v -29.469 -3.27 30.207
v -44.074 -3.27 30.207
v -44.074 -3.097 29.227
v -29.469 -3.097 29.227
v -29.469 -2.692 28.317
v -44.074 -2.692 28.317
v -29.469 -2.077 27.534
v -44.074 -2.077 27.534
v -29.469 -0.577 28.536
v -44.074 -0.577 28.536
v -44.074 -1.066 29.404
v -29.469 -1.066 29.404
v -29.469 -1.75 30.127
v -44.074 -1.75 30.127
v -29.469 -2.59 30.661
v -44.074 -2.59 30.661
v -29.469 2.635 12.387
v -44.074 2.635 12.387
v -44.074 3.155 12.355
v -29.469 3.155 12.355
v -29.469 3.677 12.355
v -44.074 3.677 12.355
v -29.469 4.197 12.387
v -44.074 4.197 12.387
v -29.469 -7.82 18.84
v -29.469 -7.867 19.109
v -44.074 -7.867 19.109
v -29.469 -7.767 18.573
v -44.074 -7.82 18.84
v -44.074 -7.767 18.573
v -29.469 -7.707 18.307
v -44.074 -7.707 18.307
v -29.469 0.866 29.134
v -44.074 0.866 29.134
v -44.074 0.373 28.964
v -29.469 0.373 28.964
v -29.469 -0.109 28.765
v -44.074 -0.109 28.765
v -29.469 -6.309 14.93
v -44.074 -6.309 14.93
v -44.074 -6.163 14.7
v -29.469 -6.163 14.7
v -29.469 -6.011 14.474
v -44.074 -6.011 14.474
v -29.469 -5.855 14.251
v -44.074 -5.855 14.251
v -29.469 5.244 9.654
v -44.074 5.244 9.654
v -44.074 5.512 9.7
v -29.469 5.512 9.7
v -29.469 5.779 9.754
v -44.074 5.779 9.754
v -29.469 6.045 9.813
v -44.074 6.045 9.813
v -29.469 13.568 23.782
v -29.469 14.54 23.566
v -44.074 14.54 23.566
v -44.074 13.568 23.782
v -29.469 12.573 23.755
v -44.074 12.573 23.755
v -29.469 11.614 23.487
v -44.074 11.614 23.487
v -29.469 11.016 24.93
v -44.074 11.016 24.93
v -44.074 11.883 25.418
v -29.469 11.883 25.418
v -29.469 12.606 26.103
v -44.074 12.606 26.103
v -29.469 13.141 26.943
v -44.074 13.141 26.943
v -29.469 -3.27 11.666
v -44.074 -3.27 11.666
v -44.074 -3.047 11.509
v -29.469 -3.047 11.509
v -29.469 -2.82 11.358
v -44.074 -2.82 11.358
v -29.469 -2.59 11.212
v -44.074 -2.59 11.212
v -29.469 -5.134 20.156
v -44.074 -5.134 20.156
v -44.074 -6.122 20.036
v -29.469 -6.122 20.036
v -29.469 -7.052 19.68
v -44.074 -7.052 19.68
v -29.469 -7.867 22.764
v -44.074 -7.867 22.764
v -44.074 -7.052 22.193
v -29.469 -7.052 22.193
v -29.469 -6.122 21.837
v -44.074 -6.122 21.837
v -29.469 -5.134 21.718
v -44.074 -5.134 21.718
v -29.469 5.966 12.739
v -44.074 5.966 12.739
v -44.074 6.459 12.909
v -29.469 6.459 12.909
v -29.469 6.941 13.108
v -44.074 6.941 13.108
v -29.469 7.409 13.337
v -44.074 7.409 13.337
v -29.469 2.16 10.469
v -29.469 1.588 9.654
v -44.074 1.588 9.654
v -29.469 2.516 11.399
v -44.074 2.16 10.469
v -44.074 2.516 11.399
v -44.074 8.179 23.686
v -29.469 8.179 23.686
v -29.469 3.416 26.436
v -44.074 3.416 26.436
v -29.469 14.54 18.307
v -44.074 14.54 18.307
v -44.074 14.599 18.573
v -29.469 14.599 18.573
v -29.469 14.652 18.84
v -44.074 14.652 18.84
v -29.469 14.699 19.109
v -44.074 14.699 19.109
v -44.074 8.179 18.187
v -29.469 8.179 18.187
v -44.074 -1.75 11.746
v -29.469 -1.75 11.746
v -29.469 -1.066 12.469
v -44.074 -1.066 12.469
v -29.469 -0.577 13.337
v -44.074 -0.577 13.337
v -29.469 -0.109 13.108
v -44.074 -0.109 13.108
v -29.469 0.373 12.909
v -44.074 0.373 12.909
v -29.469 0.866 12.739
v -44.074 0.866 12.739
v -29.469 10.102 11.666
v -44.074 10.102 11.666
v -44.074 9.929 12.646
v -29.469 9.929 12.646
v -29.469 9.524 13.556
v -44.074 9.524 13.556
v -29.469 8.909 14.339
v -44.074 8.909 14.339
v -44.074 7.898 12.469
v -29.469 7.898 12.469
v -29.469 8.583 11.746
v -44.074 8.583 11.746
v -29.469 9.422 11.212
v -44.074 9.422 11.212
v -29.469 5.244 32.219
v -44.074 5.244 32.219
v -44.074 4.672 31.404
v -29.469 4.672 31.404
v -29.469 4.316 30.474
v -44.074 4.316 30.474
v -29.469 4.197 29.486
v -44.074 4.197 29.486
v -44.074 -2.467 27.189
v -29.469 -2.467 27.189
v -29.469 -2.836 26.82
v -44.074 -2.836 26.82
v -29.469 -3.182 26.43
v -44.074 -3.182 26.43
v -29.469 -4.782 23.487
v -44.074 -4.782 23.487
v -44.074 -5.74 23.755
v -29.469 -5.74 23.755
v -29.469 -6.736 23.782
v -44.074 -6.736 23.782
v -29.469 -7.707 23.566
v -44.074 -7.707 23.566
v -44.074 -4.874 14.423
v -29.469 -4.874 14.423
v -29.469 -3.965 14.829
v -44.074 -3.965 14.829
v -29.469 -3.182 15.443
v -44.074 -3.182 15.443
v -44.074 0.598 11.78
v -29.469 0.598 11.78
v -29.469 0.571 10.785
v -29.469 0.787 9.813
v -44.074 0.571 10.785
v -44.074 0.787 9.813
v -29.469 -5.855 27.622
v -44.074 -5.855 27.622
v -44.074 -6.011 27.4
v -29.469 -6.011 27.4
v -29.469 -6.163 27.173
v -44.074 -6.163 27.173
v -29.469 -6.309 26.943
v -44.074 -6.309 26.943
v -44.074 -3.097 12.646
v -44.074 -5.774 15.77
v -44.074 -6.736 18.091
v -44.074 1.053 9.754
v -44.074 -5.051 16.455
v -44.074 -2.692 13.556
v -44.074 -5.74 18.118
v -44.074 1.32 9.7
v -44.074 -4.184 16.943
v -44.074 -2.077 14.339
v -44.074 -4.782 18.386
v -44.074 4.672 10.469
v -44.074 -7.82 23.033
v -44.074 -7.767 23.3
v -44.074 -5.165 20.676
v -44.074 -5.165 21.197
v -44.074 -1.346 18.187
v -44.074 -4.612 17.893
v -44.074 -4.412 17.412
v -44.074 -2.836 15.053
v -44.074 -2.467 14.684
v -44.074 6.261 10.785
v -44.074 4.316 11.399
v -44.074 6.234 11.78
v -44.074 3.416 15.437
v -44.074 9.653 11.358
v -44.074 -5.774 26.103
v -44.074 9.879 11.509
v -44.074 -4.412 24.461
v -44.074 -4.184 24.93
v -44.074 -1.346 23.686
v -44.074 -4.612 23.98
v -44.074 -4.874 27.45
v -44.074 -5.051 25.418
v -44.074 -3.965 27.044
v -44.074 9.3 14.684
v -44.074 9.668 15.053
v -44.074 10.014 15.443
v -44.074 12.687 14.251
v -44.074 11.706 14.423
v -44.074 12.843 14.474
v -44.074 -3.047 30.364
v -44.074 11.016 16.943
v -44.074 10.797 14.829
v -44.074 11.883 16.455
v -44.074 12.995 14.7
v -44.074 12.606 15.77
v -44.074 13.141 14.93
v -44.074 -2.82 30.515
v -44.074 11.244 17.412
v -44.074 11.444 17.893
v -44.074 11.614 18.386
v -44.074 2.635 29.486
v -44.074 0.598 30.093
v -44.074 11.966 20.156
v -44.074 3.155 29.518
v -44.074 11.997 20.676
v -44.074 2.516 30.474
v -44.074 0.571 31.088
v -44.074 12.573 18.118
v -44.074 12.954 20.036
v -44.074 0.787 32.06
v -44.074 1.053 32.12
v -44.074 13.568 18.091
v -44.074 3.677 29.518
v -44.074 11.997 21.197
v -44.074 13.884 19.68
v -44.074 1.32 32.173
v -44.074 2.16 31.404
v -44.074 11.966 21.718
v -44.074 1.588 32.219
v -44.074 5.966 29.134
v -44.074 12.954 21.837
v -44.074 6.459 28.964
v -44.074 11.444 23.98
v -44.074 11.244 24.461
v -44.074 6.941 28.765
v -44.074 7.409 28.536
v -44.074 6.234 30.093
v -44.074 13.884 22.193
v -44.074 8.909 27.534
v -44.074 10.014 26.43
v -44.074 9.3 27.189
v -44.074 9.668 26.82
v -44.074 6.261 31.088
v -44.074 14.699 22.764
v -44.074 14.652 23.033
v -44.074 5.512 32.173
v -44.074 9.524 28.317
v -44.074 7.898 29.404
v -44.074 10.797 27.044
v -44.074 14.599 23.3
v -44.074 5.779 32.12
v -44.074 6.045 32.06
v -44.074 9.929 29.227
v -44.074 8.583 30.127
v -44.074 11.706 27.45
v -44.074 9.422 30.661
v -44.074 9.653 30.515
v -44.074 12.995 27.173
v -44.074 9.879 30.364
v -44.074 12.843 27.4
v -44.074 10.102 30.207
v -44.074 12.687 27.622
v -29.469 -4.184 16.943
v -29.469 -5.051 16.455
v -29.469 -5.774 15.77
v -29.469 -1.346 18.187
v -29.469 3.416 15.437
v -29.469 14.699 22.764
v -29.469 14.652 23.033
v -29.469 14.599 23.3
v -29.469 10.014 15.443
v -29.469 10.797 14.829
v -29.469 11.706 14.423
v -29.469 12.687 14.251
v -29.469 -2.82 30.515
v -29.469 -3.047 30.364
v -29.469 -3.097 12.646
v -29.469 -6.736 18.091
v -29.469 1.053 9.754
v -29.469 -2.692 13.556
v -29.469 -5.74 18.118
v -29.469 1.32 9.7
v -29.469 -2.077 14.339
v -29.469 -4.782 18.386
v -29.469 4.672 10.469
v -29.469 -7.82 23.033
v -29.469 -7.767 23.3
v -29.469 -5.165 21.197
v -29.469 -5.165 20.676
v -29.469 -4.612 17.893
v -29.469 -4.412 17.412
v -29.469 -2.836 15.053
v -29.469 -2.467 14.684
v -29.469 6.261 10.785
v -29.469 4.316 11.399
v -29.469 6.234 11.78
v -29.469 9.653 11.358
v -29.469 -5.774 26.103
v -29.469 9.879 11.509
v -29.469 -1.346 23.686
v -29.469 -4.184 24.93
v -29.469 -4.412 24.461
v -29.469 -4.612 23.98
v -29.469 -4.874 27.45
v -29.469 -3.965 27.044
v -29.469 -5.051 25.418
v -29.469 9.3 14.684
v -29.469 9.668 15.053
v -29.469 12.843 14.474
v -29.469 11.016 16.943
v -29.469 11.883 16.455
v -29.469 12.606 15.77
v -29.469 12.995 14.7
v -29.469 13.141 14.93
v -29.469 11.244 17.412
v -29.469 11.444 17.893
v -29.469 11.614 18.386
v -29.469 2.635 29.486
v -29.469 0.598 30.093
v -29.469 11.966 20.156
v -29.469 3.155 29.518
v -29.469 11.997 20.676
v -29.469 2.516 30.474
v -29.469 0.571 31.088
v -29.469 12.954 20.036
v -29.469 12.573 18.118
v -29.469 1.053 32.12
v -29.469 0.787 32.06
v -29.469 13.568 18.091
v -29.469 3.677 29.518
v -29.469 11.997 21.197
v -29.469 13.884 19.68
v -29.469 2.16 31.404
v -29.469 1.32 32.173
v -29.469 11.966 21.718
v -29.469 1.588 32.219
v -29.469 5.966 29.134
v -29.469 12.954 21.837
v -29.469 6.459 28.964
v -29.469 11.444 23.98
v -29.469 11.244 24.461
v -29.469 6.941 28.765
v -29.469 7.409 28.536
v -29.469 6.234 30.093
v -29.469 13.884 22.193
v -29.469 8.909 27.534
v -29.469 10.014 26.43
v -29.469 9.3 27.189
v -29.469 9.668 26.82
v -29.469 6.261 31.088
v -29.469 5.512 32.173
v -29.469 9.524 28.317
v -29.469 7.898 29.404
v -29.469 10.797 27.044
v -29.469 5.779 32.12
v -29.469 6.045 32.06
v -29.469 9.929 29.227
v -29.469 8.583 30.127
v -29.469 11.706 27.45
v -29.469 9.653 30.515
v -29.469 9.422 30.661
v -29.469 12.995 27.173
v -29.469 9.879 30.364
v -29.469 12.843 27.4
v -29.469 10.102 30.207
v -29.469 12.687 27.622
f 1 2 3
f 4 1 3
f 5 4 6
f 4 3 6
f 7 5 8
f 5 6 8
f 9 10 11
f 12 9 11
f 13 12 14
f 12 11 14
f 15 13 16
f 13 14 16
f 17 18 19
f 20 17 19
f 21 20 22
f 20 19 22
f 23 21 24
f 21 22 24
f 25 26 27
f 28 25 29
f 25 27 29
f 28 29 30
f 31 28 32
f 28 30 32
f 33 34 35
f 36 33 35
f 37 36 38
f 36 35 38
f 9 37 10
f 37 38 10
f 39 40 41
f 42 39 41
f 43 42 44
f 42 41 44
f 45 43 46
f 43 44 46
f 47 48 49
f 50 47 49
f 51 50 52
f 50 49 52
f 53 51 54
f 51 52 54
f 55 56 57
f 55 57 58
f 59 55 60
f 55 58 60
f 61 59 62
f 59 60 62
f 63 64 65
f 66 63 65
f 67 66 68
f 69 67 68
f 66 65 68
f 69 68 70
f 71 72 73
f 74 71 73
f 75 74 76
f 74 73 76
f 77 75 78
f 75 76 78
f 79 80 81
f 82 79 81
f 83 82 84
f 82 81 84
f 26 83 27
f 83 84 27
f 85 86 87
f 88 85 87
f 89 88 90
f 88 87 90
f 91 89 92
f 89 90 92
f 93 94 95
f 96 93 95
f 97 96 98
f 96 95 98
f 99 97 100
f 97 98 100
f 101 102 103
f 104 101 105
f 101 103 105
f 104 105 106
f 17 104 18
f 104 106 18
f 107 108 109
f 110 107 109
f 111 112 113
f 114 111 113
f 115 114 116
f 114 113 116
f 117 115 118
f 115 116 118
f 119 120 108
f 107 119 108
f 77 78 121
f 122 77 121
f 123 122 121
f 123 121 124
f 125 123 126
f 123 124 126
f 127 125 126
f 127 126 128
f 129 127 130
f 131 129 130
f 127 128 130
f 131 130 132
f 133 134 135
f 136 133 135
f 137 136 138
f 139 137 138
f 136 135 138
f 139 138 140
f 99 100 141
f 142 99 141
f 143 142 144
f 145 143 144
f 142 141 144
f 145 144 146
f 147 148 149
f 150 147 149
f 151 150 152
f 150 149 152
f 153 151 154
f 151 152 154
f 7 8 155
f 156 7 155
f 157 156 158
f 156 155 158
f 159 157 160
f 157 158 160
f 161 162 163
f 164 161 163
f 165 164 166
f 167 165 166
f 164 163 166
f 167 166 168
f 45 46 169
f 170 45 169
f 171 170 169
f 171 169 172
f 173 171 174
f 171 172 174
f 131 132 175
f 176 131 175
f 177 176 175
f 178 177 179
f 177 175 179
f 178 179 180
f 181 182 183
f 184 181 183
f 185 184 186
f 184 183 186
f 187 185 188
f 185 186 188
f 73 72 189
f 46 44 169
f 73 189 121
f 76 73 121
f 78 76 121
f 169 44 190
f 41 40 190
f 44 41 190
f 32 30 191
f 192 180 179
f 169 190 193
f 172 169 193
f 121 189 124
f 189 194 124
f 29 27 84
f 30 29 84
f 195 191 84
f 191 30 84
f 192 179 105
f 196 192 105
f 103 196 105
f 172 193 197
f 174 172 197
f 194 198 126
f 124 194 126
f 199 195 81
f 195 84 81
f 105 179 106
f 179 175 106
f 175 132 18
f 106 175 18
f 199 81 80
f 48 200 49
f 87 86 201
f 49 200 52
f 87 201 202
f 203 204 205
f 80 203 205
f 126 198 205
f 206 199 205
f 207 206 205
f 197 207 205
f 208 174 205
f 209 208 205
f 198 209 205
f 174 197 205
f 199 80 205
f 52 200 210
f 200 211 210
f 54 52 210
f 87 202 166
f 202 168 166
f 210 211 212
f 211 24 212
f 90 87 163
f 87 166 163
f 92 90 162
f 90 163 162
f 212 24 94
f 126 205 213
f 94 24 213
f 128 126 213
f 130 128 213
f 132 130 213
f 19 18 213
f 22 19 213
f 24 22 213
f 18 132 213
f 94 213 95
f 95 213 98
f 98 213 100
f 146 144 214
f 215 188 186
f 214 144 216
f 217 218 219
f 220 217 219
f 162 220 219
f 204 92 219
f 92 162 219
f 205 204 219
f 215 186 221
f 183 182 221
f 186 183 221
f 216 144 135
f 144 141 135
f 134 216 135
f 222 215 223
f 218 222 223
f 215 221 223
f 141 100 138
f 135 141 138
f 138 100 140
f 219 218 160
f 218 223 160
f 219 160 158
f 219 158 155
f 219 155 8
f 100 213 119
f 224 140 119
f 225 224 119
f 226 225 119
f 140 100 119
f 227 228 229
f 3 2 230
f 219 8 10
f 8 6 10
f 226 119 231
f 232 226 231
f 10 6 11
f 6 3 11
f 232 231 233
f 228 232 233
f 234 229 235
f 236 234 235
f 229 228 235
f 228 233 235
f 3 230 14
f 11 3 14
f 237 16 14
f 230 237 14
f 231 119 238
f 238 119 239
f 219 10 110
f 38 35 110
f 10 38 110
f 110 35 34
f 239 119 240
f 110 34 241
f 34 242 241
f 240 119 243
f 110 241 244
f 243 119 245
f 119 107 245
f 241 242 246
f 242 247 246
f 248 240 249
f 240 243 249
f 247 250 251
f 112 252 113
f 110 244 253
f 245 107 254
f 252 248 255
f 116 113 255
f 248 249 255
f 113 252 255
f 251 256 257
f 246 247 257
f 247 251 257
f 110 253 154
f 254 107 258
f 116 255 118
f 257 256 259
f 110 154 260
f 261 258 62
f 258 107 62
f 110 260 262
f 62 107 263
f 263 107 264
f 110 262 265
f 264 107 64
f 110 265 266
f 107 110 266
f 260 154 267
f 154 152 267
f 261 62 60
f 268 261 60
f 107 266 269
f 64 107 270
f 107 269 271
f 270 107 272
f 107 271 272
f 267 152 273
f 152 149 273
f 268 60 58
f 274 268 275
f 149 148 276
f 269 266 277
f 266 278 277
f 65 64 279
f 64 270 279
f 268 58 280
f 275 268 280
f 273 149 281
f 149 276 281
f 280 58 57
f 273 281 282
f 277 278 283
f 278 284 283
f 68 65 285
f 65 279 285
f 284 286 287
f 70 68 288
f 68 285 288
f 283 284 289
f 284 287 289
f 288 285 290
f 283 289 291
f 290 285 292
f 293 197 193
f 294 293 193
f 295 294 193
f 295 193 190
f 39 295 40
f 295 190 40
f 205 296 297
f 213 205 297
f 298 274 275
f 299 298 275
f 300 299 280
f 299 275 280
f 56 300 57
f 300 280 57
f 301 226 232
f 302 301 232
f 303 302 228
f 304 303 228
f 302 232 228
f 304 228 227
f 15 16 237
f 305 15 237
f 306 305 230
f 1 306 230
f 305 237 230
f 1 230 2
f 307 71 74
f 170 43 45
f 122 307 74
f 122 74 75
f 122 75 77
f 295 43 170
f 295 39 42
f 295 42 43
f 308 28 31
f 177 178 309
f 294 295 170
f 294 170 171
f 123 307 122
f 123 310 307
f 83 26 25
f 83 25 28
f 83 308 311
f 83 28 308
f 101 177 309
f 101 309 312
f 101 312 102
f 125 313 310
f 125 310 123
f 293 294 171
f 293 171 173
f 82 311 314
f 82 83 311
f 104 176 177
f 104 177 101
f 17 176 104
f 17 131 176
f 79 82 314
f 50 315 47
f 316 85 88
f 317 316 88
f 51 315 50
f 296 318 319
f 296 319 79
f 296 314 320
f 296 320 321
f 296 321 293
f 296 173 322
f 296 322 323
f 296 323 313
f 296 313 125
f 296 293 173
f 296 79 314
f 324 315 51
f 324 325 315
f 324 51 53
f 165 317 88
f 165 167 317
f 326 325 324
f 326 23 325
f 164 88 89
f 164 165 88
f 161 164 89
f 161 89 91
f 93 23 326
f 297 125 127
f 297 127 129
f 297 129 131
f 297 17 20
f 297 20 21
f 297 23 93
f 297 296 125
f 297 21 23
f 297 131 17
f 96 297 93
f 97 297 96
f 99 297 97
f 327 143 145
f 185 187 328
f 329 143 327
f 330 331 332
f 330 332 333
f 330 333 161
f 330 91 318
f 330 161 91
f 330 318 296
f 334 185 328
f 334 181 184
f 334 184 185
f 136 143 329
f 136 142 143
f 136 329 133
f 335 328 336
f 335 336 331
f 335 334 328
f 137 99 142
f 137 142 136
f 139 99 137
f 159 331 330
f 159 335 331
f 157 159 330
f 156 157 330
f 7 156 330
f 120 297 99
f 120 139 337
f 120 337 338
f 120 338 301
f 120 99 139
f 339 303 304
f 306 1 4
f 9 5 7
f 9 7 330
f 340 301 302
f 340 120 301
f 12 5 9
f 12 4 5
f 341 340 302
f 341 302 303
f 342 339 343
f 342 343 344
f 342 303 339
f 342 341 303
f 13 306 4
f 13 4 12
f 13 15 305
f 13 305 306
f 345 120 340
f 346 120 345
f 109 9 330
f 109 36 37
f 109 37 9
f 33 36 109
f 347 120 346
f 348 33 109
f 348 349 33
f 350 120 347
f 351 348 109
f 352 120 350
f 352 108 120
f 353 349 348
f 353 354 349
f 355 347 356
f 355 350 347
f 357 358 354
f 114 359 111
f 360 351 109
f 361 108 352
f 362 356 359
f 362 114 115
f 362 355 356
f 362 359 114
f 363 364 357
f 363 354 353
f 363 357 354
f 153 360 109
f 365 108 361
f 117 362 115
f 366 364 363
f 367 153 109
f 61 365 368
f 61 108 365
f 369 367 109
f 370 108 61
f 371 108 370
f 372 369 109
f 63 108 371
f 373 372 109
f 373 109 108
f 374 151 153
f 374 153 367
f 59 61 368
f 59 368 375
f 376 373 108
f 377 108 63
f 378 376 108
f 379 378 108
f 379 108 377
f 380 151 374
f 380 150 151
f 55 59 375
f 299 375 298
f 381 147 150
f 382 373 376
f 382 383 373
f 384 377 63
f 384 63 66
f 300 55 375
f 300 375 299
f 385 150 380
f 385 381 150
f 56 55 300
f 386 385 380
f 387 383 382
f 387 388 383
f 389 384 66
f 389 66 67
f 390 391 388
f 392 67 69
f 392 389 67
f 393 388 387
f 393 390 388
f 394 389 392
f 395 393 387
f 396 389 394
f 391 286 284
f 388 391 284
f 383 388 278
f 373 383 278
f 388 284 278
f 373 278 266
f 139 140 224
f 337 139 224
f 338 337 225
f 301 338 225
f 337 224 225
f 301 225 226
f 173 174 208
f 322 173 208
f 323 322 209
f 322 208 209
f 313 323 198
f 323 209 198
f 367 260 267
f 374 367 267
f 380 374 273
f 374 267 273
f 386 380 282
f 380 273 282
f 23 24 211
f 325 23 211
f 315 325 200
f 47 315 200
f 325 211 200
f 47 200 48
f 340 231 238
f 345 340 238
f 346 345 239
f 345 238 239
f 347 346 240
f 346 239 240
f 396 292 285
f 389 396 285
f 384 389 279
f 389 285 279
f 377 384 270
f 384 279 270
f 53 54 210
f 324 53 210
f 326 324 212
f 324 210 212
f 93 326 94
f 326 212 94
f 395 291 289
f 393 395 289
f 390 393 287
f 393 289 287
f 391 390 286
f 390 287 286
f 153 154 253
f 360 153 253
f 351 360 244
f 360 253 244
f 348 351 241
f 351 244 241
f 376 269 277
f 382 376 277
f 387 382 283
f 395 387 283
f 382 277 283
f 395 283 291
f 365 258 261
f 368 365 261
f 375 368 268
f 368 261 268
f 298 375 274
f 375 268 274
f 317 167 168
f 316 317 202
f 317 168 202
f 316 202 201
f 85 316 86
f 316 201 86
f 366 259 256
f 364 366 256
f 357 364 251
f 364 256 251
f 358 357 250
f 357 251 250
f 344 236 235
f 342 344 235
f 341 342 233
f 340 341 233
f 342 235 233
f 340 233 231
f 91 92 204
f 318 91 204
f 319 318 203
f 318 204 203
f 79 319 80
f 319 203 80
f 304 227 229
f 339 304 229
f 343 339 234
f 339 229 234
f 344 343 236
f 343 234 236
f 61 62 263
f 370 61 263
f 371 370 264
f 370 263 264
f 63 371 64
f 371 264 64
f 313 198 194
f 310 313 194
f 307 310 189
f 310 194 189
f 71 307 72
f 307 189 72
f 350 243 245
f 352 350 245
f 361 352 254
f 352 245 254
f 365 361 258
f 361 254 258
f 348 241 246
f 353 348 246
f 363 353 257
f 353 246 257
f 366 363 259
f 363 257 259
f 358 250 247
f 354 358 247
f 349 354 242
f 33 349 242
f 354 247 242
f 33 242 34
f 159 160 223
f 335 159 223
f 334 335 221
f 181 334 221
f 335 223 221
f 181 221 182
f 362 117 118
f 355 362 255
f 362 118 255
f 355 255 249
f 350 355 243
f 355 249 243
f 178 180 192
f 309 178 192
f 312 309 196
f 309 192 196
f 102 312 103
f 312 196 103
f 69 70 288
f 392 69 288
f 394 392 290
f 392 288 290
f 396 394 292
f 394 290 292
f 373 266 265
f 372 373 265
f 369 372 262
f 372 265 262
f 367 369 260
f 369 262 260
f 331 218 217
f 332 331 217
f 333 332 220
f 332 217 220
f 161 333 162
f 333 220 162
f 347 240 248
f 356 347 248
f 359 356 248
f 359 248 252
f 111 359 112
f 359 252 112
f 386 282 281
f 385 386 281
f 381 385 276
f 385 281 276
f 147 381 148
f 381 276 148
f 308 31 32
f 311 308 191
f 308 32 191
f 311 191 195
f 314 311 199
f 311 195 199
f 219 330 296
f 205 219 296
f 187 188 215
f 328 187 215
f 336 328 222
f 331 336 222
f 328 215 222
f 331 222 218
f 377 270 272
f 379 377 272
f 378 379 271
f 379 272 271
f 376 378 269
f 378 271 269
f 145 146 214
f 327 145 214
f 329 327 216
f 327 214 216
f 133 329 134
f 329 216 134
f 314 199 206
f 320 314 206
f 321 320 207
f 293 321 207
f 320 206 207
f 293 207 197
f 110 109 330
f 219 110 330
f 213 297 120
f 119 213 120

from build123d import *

# Parameters (mm, degrees)
SPUR_START             = -44.074195703
SPUR_GEAR_AI_OUTLINE_R = 4.7625
SPUR_GEAR_AI_DEPTH     = 14.605
CUT_EXTRUDE1_DEPTH     = 39.307434666


# Read off the part's stored shape, not the designer's step: spur gear_ai
with BuildPart() as part:
    # spur gear_ai outline → spur gear_ai (new body)
    with BuildSketch(Plane.YZ.offset(SPUR_START)):
        with BuildLine():
            ThreePointArc((12.686684526, 14.250652999), (12.919777657, 14.586350288), (13.140720632, 14.930166051))
            ThreePointArc((13.140720632, 14.930166051), (12.265878987, 16.134593199), (11.016013995, 16.943190851))
            ThreePointArc((11.016013995, 16.943190851), (11.347770551, 17.651104248), (11.613753604, 18.386261921))
            ThreePointArc((11.613753604, 18.386261921), (13.069306498, 18.074238793), (14.539571561, 18.307290937))
            ThreePointArc((14.539571561, 18.307290937), (14.626455743, 18.70663567), (14.699007839, 19.108831233))
            ThreePointArc((14.699007839, 19.108831233), (13.429845234, 19.88678942), (11.965683625, 20.155533616))
            ThreePointArc((11.965683625, 20.155533616), (12.001279988, 20.936518051), (11.965683625, 21.717502486))
            ThreePointArc((11.965683625, 21.717502486), (13.429845234, 21.986246682), (14.699007839, 22.764204869))
            ThreePointArc((14.699007839, 22.764204869), (14.626455743, 23.166400432), (14.539571561, 23.565745165))
            ThreePointArc((14.539571561, 23.565745165), (13.069306498, 23.79879731), (11.613753604, 23.486774182))
            ThreePointArc((11.613753604, 23.486774182), (11.347770551, 24.221931855), (11.016013995, 24.929845251))
            ThreePointArc((11.016013995, 24.929845251), (12.265878987, 25.738442903), (13.140720632, 26.942870051))
            ThreePointArc((13.140720632, 26.942870051), (12.919777657, 27.286685815), (12.686684526, 27.622383104))
            ThreePointArc((12.686684526, 27.622383104), (11.239151532, 27.275049128), (10.013802086, 26.42976137))
            ThreePointArc((10.013802086, 26.42976137), (9.486733126, 27.007171189), (8.909323306, 27.534240149))
            ThreePointArc((8.909323306, 27.534240149), (9.754611065, 28.759589595), (10.10194504, 30.207122589))
            ThreePointArc((10.10194504, 30.207122589), (9.766247751, 30.44021572), (9.422431988, 30.661158695))
            ThreePointArc((9.422431988, 30.661158695), (8.21800484, 29.78631705), (7.409407188, 28.536452058))
            ThreePointArc((7.409407188, 28.536452058), (6.701493792, 28.868208614), (5.966336119, 29.134191667))
            ThreePointArc((5.966336119, 29.134191667), (6.278359246, 30.589744561), (6.045307102, 32.060009624))
            ThreePointArc((6.045307102, 32.060009624), (5.645962369, 32.146893806), (5.243766806, 32.219445902))
            ThreePointArc((5.243766806, 32.219445902), (4.465808619, 30.950283297), (4.197064423, 29.486121688))
            ThreePointArc((4.197064423, 29.486121688), (3.416079988, 29.521718051), (2.635095553, 29.486121688))
            ThreePointArc((2.635095553, 29.486121688), (2.366351357, 30.950283297), (1.58839317, 32.219445902))
            ThreePointArc((1.58839317, 32.219445902), (1.186197607, 32.146893806), (0.786852874, 32.060009624))
            ThreePointArc((0.786852874, 32.060009624), (0.55380073, 30.589744561), (0.865823857, 29.134191667))
            ThreePointArc((0.865823857, 29.134191667), (0.130666184, 28.868208614), (-0.577247212, 28.536452058))
            ThreePointArc((-0.577247212, 28.536452058), (-1.385844864, 29.78631705), (-2.590272012, 30.661158695))
            ThreePointArc((-2.590272012, 30.661158695), (-2.934087775, 30.44021572), (-3.269785064, 30.207122589))
            ThreePointArc((-3.269785064, 30.207122589), (-2.922451089, 28.759589595), (-2.07716333, 27.534240149))
            ThreePointArc((-2.07716333, 27.534240149), (-2.65457315, 27.007171189), (-3.18164211, 26.42976137))
            ThreePointArc((-3.18164211, 26.42976137), (-4.406991556, 27.275049128), (-5.85452455, 27.622383104))
            ThreePointArc((-5.85452455, 27.622383104), (-6.087617681, 27.286685815), (-6.308560656, 26.942870051))
            ThreePointArc((-6.308560656, 26.942870051), (-5.43371901, 25.738442903), (-4.183854019, 24.929845251))
            ThreePointArc((-4.183854019, 24.929845251), (-4.515610574, 24.221931855), (-4.781593628, 23.486774182))
            ThreePointArc((-4.781593628, 23.486774182), (-6.237146522, 23.79879731), (-7.707411585, 23.565745165))
            ThreePointArc((-7.707411585, 23.565745165), (-7.794295767, 23.166400432), (-7.866847863, 22.764204869))
            ThreePointArc((-7.866847863, 22.764204869), (-6.597685258, 21.986246682), (-5.133523649, 21.717502486))
            ThreePointArc((-5.133523649, 21.717502486), (-5.169120012, 20.936518051), (-5.133523649, 20.155533616))
            ThreePointArc((-5.133523649, 20.155533616), (-6.597685258, 19.88678942), (-7.866847863, 19.108831233))
            ThreePointArc((-7.866847863, 19.108831233), (-7.794295767, 18.70663567), (-7.707411585, 18.307290937))
            ThreePointArc((-7.707411585, 18.307290937), (-6.237146522, 18.074238793), (-4.781593628, 18.386261921))
            ThreePointArc((-4.781593628, 18.386261921), (-4.515610574, 17.651104248), (-4.183854019, 16.943190851))
            ThreePointArc((-4.183854019, 16.943190851), (-5.43371901, 16.134593199), (-6.308560656, 14.930166051))
            ThreePointArc((-6.308560656, 14.930166051), (-6.087617681, 14.586350288), (-5.85452455, 14.250652999))
            ThreePointArc((-5.85452455, 14.250652999), (-4.406991556, 14.597986974), (-3.18164211, 15.443274733))
            ThreePointArc((-3.18164211, 15.443274733), (-2.65457315, 14.865864913), (-2.07716333, 14.338795953))
            ThreePointArc((-2.07716333, 14.338795953), (-2.922451089, 13.113446507), (-3.269785064, 11.665913513))
            ThreePointArc((-3.269785064, 11.665913513), (-2.934087775, 11.432820383), (-2.590272012, 11.211877407))
            ThreePointArc((-2.590272012, 11.211877407), (-1.385844864, 12.086719053), (-0.577247212, 13.336584044))
            ThreePointArc((-0.577247212, 13.336584044), (0.130666184, 13.004827489), (0.865823857, 12.738844436))
            ThreePointArc((0.865823857, 12.738844436), (0.55380073, 11.283291542), (0.786852874, 9.813026478))
            ThreePointArc((0.786852874, 9.813026478), (1.186197607, 9.726142296), (1.58839317, 9.6535902))
            ThreePointArc((1.58839317, 9.6535902), (2.366351357, 10.922752805), (2.635095553, 12.386914414))
            ThreePointArc((2.635095553, 12.386914414), (3.416079988, 12.351318051), (4.197064423, 12.386914414))
            ThreePointArc((4.197064423, 12.386914414), (4.465808619, 10.922752805), (5.243766806, 9.6535902))
            ThreePointArc((5.243766806, 9.6535902), (5.645962369, 9.726142296), (6.045307102, 9.813026478))
            ThreePointArc((6.045307102, 9.813026478), (6.278359246, 11.283291542), (5.966336119, 12.738844436))
            ThreePointArc((5.966336119, 12.738844436), (6.701493792, 13.004827489), (7.409407188, 13.336584044))
            ThreePointArc((7.409407188, 13.336584044), (8.21800484, 12.086719053), (9.422431988, 11.211877407))
            ThreePointArc((9.422431988, 11.211877407), (9.766247751, 11.432820383), (10.10194504, 11.665913513))
            ThreePointArc((10.10194504, 11.665913513), (9.754611065, 13.113446507), (8.909323306, 14.338795953))
            ThreePointArc((8.909323306, 14.338795953), (9.486733126, 14.865864913), (10.013802086, 15.443274733))
            ThreePointArc((10.013802086, 15.443274733), (11.239151532, 14.597986974), (12.686684526, 14.250652999))
        make_face()
        with Locations((3.416079988, 20.936518051)):
            Circle(SPUR_GEAR_AI_OUTLINE_R, mode=Mode.SUBTRACT)
    extrude(amount=SPUR_GEAR_AI_DEPTH)

    # Sketch1 → Cut-Extrude1 (cut, through all)
    with BuildSketch(Plane(origin=(-29.469195703, 0, 0), x_dir=(0, 0, -1), z_dir=(1, 0, 0))):
        Polygon((-18.186887394, 8.178579988), (-23.686148708, 8.178579988), (-26.435779365, 3.416079988), (-23.686148708, -1.346420012), (-18.186887394, -1.346420012), (-15.437256737, 3.416079988), align=None)
    extrude(amount=-CUT_EXTRUDE1_DEPTH, mode=Mode.SUBTRACT)


solid = part.part
